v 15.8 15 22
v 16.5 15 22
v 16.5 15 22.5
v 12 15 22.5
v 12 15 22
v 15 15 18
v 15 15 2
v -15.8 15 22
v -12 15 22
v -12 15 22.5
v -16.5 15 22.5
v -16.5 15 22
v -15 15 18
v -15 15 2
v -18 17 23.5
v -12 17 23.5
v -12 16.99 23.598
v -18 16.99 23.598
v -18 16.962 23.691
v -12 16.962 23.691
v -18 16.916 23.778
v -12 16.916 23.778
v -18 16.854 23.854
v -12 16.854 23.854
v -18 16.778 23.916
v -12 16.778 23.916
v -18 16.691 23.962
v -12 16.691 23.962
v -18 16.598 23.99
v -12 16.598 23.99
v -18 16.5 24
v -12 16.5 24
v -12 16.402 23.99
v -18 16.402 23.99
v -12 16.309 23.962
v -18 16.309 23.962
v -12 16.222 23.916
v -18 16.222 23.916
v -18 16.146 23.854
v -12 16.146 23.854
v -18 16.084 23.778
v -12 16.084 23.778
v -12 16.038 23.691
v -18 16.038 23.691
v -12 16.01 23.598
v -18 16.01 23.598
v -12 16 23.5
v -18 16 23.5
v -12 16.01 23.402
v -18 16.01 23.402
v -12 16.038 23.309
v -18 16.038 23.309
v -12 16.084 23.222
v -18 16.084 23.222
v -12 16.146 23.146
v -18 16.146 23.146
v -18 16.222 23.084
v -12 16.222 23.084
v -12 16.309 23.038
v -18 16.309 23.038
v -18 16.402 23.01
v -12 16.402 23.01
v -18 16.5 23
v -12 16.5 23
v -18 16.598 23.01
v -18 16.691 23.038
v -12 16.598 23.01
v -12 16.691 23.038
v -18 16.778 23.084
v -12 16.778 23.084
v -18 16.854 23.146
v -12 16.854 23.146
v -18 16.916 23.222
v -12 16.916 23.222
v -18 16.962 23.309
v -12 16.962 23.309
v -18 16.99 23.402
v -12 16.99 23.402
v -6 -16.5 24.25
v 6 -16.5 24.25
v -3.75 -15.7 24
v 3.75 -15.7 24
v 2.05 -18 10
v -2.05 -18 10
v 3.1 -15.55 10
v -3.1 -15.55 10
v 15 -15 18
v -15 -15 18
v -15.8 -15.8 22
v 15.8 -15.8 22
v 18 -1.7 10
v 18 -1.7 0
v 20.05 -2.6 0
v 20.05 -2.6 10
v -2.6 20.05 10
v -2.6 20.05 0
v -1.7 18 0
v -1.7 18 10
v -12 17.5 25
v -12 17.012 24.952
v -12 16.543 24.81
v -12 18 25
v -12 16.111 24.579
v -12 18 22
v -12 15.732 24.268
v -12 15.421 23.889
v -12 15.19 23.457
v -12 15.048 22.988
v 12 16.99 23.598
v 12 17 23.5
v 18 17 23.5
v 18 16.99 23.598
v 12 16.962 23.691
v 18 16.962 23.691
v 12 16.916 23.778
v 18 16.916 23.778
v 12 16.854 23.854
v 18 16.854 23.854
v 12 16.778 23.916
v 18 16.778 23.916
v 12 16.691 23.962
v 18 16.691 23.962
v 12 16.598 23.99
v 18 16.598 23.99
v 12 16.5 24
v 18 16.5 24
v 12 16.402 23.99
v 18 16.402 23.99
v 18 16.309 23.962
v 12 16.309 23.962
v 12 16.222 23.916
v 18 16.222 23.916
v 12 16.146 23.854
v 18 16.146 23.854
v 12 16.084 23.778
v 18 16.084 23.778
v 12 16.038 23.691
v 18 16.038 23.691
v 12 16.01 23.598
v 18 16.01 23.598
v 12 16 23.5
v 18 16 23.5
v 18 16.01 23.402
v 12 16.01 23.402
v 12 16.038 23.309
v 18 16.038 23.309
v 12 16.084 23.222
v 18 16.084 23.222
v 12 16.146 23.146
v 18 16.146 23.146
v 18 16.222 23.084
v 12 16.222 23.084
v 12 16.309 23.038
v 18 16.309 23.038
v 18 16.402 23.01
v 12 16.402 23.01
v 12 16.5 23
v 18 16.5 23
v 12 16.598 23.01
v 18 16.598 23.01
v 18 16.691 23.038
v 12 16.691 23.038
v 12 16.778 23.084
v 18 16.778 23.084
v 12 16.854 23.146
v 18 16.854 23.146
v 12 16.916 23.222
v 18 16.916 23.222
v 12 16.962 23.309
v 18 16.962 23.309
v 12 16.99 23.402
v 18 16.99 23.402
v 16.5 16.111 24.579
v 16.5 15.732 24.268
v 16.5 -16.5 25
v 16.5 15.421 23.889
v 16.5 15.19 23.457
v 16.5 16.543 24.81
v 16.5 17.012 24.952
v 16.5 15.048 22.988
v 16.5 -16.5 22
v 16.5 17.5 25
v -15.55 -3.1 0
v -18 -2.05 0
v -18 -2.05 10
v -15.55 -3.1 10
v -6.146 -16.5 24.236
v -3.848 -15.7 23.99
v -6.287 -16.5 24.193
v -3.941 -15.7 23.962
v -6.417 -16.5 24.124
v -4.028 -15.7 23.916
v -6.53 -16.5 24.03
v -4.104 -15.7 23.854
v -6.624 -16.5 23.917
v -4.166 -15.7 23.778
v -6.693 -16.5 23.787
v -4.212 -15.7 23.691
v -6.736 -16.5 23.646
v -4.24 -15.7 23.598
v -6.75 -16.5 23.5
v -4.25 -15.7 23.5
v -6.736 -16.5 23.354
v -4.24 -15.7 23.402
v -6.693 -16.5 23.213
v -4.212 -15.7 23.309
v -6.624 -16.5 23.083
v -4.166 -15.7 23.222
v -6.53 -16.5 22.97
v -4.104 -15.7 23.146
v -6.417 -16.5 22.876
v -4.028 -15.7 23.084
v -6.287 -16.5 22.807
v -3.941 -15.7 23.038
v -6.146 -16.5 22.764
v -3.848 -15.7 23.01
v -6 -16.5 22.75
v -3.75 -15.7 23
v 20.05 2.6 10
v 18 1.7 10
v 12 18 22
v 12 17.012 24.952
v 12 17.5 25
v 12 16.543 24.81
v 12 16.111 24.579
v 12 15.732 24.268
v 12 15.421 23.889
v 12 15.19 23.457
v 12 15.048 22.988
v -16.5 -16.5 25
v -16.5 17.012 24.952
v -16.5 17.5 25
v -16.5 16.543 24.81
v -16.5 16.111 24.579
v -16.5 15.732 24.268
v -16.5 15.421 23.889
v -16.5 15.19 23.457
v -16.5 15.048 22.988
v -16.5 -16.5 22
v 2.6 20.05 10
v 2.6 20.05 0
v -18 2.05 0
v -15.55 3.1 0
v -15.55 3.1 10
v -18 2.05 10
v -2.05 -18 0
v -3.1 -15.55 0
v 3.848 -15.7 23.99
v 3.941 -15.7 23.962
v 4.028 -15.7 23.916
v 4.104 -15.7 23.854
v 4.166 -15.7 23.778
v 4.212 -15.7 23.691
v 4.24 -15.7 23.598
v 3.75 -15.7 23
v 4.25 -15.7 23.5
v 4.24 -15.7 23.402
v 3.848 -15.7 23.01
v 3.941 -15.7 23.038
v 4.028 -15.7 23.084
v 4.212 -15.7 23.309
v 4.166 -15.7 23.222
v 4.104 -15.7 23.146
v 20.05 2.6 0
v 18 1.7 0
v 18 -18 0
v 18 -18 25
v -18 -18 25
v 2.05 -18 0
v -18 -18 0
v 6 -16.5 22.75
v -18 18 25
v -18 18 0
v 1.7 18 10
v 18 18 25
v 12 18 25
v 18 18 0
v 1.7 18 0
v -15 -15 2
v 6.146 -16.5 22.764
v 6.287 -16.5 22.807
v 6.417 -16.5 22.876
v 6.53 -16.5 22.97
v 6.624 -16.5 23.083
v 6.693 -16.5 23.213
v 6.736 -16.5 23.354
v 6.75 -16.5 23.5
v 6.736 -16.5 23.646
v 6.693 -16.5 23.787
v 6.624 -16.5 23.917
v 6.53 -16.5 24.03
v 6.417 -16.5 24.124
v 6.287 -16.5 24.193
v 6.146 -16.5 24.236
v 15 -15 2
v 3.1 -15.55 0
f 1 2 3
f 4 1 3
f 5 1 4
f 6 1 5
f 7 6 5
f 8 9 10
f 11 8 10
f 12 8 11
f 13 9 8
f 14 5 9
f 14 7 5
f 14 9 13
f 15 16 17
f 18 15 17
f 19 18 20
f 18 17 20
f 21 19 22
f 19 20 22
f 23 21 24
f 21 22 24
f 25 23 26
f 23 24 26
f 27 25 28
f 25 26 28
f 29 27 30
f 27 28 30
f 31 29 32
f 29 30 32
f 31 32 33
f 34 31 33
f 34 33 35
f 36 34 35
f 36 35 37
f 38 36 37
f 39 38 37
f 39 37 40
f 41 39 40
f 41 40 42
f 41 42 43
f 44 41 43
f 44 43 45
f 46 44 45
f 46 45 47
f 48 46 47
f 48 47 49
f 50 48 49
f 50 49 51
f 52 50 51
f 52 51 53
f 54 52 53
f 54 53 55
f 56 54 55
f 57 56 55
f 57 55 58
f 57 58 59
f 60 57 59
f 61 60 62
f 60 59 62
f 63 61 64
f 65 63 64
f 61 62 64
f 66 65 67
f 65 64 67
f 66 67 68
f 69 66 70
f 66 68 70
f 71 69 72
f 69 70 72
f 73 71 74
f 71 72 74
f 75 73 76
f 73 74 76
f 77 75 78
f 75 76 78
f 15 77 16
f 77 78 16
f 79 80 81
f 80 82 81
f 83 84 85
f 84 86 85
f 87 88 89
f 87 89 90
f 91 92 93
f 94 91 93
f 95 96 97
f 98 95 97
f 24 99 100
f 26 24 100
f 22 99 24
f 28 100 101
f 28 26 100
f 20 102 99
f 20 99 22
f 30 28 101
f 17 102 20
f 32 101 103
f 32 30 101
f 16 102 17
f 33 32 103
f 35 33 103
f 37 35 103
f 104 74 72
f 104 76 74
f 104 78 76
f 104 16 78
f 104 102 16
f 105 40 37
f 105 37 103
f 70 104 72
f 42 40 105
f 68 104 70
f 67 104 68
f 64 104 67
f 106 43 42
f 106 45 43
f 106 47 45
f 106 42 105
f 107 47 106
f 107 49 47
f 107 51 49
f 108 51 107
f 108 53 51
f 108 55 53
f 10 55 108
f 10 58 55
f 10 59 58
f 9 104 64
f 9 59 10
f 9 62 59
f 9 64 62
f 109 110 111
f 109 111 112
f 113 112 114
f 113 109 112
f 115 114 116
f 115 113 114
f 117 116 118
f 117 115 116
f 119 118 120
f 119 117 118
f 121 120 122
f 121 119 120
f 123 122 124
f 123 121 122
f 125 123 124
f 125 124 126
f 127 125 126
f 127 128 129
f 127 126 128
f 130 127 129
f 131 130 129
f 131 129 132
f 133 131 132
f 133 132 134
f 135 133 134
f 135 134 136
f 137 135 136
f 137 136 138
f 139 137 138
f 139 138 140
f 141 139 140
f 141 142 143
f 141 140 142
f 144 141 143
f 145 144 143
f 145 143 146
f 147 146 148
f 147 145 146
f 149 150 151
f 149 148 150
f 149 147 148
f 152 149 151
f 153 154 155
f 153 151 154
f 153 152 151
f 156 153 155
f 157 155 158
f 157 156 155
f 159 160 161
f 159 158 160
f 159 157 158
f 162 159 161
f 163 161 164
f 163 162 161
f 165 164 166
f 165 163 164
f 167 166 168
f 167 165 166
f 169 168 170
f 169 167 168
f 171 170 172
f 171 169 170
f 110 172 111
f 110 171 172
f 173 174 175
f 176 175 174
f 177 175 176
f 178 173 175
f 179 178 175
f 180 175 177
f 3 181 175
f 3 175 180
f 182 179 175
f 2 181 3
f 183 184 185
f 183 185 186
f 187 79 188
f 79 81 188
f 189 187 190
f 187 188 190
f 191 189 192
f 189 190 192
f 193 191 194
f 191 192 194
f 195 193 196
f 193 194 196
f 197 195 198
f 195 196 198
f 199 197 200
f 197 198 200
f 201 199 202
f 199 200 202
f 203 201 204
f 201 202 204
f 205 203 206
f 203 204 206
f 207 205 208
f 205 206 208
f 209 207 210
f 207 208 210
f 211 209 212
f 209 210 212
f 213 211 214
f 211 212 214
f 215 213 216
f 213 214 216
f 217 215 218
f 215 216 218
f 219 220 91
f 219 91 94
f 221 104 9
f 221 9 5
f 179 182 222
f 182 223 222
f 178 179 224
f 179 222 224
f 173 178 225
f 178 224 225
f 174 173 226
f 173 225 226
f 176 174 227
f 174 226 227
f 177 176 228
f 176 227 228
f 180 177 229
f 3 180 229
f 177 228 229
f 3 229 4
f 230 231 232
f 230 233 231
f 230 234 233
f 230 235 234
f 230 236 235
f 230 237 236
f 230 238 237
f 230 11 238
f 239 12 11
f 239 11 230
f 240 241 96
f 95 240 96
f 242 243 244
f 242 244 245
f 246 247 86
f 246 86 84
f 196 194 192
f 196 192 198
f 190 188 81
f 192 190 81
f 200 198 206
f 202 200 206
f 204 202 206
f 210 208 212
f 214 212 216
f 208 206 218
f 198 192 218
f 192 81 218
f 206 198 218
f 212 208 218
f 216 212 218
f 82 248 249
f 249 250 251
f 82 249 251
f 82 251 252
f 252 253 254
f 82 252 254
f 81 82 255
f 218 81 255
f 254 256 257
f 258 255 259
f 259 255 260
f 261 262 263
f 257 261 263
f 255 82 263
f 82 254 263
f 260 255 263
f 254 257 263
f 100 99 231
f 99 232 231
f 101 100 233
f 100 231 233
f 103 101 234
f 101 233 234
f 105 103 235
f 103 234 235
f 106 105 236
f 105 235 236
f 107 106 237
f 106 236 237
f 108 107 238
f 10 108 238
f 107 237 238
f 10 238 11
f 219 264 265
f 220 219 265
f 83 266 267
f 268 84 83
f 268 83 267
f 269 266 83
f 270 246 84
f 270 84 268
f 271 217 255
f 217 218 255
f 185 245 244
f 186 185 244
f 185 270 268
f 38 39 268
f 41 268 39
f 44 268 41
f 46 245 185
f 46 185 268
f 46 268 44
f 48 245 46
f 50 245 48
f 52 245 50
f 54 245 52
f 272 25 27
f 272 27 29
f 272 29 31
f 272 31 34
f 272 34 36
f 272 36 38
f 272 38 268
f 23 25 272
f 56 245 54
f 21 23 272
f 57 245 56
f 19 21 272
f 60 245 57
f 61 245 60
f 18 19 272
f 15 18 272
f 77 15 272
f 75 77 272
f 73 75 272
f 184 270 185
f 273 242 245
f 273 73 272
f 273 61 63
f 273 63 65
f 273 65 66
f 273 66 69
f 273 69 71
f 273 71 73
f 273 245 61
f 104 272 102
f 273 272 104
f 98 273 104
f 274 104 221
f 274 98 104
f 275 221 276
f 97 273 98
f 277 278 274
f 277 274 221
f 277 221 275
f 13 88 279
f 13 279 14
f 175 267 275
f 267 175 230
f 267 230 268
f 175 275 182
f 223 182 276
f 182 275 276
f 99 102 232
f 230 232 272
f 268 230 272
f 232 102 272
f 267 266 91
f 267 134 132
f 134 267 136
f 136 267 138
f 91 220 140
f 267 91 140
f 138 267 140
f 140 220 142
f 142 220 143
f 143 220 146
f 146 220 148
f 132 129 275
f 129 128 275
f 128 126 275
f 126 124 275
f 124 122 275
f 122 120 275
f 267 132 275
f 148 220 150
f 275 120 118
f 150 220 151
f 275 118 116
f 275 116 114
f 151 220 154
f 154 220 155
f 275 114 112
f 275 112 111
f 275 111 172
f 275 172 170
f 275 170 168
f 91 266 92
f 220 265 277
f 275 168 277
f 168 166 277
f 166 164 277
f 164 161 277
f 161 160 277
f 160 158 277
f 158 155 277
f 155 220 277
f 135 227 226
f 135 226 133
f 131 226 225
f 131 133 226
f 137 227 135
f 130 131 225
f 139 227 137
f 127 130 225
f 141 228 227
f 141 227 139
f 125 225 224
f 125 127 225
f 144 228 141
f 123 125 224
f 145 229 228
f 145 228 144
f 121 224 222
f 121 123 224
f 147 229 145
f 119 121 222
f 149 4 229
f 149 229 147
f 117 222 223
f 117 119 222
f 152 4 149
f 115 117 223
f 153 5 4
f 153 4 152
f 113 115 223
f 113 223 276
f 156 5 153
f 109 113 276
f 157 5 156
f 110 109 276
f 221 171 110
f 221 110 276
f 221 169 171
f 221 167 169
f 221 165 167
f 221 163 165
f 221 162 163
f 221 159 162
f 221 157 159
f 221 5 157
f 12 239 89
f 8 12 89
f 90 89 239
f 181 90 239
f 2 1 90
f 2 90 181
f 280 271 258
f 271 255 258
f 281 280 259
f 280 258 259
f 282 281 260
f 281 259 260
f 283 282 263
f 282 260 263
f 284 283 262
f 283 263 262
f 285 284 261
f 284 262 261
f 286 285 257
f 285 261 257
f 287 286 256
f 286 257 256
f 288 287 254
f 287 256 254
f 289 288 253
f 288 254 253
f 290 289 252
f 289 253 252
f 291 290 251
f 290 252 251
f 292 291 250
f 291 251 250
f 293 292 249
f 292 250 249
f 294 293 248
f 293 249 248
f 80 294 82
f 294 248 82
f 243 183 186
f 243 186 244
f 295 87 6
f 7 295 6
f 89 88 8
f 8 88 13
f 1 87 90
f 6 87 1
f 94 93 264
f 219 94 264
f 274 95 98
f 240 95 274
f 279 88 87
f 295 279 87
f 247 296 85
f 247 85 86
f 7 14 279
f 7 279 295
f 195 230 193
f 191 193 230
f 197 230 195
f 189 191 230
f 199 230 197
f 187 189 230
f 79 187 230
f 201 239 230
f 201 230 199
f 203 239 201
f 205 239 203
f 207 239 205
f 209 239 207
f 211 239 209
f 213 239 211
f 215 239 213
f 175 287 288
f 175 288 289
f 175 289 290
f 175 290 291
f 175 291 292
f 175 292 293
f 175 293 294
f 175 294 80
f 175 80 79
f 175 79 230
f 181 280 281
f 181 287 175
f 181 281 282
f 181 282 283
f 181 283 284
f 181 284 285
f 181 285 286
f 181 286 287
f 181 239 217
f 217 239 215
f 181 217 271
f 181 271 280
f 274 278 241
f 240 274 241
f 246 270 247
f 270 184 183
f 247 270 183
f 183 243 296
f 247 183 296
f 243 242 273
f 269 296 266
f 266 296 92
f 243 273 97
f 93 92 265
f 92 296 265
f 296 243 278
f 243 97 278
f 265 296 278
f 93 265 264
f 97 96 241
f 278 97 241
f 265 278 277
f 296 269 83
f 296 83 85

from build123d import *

# Parameters (mm, degrees)
SKETCH_W             = 36
SKETCH_H             = 36
PAD_DEPTH            = 22
PAD001_DEPTH         = 10
POCKET_DEPTH         = 10
SKETCH004_W          = 30
SKETCH004_H          = 30
POCKET001_DEPTH      = 20
PAD002_DEPTH         = 3
SKETCH006_R          = 0.5
POCKET002_DEPTH      = 18.001
POCKET002_DEPTH_BACK = 20.051
FILLET001_R          = 2.5
CHAMFER_SIZE2        = 4
CHAMFER_SIZE         = 0.8


with BuildPart() as part:
    # Sketch (on DatumPlane) → Pad (new body)
    with BuildSketch(Plane.XY):
        Rectangle(SKETCH_W, SKETCH_H)
    extrude(amount=PAD_DEPTH)

    # Sketch001 (on DatumPlane) → Pad001 (join)
    with BuildSketch(Plane.XY):
        Polygon((-1.7, 18), (1.7, 18), (2.6, 20.05), (-2.6, 20.05), align=None)
        Polygon((18, 1.7), (18, -1.7), (20.05, -2.6), (20.05, 2.6), align=None)
    extrude(amount=PAD001_DEPTH)

    # Sketch003 (on DatumPlane) → Pocket (cut)
    with BuildSketch(Plane.XY):
        Polygon((-2.05, -18), (2.05, -18), (3.1, -15.55), (-3.1, -15.55), align=None)
        Polygon((-18, 2.05), (-18, -2.05), (-15.55, -3.1), (-15.55, 3.1), align=None)
    extrude(amount=POCKET_DEPTH, mode=Mode.SUBTRACT)

    # Sketch004 (on DatumPlane) → Pocket001 (cut)
    with BuildSketch(Plane.XY.offset(22)):
        Rectangle(SKETCH004_W, SKETCH004_H)
    extrude(amount=-POCKET001_DEPTH, mode=Mode.SUBTRACT)

    # Sketch005 (on DatumPlane) → Pad002 (join)
    with BuildSketch(Plane.XY.offset(22)):
        Polygon((-18, 18), (-12, 18), (-12, 15), (-16.5, 15), (-16.5, -16.5), (16.5, -16.5), (16.5, 15), (12, 15), (12, 18), (18, 18), (18, -18), (-18, -18), align=None)
    extrude(amount=PAD002_DEPTH)

    # Sketch006 (on DatumPlane) → Pocket002 (cut, two sides)
    with BuildSketch(Plane.YZ) as pocket002_sk:
        with Locations((16.5, 23.5)):
            Circle(SKETCH006_R)
    extrude(amount=-POCKET002_DEPTH, mode=Mode.SUBTRACT)
    extrude(pocket002_sk.sketch, amount=POCKET002_DEPTH_BACK, mode=Mode.SUBTRACT)

    # Sketch007 (on DatumPlane) → AdditiveLoft section 0
    with BuildSketch(Plane(origin=(0, -16.5, 0), x_dir=(-1, 0, 0), z_dir=(0, -1, 0))):
        with BuildLine():
            ThreePointArc((-6, -22.75), (-6.75, -23.5), (-6, -24.25))
            Line((-6, -24.25), (6, -24.25))
            ThreePointArc((6, -24.25), (6.75, -23.5), (6, -22.75))
            Line((-6, -22.75), (6, -22.75))
        make_face()
    # Sketch008 (on DatumPlane) → AdditiveLoft section 1
    with BuildSketch(Plane.XZ.offset(15.7)):
        with BuildLine():
            ThreePointArc((-3.75, 24), (-4.25, 23.5), (-3.75, 23))
            Line((-3.75, 23), (3.75, 23))
            ThreePointArc((3.75, 23), (4.25, 23.5), (3.75, 24))
            Line((-3.75, 24), (3.75, 24))
        make_face()
    loft()

    # Fillet001
    fillet001_edges = [part.edges().sort_by_distance(p)[0] for p in [
        (-14.25, 15, 25),
        (14.25, 15, 25),
    ]]
    fillet(fillet001_edges, radius=FILLET001_R)

    # Chamfer
    chamfer_edges = [part.edges().sort_by_distance(p)[0] for p in [
        (15, 0, 22),
        (0, -15, 22),
        (-15, 0, 22),
    ]]
    chamfer_side = part.faces().sort_by_distance((-15.75, 14.543793, 22))[0]
    chamfer(chamfer_edges, length=CHAMFER_SIZE, length2=CHAMFER_SIZE2, reference=chamfer_side)


solid = part.part
